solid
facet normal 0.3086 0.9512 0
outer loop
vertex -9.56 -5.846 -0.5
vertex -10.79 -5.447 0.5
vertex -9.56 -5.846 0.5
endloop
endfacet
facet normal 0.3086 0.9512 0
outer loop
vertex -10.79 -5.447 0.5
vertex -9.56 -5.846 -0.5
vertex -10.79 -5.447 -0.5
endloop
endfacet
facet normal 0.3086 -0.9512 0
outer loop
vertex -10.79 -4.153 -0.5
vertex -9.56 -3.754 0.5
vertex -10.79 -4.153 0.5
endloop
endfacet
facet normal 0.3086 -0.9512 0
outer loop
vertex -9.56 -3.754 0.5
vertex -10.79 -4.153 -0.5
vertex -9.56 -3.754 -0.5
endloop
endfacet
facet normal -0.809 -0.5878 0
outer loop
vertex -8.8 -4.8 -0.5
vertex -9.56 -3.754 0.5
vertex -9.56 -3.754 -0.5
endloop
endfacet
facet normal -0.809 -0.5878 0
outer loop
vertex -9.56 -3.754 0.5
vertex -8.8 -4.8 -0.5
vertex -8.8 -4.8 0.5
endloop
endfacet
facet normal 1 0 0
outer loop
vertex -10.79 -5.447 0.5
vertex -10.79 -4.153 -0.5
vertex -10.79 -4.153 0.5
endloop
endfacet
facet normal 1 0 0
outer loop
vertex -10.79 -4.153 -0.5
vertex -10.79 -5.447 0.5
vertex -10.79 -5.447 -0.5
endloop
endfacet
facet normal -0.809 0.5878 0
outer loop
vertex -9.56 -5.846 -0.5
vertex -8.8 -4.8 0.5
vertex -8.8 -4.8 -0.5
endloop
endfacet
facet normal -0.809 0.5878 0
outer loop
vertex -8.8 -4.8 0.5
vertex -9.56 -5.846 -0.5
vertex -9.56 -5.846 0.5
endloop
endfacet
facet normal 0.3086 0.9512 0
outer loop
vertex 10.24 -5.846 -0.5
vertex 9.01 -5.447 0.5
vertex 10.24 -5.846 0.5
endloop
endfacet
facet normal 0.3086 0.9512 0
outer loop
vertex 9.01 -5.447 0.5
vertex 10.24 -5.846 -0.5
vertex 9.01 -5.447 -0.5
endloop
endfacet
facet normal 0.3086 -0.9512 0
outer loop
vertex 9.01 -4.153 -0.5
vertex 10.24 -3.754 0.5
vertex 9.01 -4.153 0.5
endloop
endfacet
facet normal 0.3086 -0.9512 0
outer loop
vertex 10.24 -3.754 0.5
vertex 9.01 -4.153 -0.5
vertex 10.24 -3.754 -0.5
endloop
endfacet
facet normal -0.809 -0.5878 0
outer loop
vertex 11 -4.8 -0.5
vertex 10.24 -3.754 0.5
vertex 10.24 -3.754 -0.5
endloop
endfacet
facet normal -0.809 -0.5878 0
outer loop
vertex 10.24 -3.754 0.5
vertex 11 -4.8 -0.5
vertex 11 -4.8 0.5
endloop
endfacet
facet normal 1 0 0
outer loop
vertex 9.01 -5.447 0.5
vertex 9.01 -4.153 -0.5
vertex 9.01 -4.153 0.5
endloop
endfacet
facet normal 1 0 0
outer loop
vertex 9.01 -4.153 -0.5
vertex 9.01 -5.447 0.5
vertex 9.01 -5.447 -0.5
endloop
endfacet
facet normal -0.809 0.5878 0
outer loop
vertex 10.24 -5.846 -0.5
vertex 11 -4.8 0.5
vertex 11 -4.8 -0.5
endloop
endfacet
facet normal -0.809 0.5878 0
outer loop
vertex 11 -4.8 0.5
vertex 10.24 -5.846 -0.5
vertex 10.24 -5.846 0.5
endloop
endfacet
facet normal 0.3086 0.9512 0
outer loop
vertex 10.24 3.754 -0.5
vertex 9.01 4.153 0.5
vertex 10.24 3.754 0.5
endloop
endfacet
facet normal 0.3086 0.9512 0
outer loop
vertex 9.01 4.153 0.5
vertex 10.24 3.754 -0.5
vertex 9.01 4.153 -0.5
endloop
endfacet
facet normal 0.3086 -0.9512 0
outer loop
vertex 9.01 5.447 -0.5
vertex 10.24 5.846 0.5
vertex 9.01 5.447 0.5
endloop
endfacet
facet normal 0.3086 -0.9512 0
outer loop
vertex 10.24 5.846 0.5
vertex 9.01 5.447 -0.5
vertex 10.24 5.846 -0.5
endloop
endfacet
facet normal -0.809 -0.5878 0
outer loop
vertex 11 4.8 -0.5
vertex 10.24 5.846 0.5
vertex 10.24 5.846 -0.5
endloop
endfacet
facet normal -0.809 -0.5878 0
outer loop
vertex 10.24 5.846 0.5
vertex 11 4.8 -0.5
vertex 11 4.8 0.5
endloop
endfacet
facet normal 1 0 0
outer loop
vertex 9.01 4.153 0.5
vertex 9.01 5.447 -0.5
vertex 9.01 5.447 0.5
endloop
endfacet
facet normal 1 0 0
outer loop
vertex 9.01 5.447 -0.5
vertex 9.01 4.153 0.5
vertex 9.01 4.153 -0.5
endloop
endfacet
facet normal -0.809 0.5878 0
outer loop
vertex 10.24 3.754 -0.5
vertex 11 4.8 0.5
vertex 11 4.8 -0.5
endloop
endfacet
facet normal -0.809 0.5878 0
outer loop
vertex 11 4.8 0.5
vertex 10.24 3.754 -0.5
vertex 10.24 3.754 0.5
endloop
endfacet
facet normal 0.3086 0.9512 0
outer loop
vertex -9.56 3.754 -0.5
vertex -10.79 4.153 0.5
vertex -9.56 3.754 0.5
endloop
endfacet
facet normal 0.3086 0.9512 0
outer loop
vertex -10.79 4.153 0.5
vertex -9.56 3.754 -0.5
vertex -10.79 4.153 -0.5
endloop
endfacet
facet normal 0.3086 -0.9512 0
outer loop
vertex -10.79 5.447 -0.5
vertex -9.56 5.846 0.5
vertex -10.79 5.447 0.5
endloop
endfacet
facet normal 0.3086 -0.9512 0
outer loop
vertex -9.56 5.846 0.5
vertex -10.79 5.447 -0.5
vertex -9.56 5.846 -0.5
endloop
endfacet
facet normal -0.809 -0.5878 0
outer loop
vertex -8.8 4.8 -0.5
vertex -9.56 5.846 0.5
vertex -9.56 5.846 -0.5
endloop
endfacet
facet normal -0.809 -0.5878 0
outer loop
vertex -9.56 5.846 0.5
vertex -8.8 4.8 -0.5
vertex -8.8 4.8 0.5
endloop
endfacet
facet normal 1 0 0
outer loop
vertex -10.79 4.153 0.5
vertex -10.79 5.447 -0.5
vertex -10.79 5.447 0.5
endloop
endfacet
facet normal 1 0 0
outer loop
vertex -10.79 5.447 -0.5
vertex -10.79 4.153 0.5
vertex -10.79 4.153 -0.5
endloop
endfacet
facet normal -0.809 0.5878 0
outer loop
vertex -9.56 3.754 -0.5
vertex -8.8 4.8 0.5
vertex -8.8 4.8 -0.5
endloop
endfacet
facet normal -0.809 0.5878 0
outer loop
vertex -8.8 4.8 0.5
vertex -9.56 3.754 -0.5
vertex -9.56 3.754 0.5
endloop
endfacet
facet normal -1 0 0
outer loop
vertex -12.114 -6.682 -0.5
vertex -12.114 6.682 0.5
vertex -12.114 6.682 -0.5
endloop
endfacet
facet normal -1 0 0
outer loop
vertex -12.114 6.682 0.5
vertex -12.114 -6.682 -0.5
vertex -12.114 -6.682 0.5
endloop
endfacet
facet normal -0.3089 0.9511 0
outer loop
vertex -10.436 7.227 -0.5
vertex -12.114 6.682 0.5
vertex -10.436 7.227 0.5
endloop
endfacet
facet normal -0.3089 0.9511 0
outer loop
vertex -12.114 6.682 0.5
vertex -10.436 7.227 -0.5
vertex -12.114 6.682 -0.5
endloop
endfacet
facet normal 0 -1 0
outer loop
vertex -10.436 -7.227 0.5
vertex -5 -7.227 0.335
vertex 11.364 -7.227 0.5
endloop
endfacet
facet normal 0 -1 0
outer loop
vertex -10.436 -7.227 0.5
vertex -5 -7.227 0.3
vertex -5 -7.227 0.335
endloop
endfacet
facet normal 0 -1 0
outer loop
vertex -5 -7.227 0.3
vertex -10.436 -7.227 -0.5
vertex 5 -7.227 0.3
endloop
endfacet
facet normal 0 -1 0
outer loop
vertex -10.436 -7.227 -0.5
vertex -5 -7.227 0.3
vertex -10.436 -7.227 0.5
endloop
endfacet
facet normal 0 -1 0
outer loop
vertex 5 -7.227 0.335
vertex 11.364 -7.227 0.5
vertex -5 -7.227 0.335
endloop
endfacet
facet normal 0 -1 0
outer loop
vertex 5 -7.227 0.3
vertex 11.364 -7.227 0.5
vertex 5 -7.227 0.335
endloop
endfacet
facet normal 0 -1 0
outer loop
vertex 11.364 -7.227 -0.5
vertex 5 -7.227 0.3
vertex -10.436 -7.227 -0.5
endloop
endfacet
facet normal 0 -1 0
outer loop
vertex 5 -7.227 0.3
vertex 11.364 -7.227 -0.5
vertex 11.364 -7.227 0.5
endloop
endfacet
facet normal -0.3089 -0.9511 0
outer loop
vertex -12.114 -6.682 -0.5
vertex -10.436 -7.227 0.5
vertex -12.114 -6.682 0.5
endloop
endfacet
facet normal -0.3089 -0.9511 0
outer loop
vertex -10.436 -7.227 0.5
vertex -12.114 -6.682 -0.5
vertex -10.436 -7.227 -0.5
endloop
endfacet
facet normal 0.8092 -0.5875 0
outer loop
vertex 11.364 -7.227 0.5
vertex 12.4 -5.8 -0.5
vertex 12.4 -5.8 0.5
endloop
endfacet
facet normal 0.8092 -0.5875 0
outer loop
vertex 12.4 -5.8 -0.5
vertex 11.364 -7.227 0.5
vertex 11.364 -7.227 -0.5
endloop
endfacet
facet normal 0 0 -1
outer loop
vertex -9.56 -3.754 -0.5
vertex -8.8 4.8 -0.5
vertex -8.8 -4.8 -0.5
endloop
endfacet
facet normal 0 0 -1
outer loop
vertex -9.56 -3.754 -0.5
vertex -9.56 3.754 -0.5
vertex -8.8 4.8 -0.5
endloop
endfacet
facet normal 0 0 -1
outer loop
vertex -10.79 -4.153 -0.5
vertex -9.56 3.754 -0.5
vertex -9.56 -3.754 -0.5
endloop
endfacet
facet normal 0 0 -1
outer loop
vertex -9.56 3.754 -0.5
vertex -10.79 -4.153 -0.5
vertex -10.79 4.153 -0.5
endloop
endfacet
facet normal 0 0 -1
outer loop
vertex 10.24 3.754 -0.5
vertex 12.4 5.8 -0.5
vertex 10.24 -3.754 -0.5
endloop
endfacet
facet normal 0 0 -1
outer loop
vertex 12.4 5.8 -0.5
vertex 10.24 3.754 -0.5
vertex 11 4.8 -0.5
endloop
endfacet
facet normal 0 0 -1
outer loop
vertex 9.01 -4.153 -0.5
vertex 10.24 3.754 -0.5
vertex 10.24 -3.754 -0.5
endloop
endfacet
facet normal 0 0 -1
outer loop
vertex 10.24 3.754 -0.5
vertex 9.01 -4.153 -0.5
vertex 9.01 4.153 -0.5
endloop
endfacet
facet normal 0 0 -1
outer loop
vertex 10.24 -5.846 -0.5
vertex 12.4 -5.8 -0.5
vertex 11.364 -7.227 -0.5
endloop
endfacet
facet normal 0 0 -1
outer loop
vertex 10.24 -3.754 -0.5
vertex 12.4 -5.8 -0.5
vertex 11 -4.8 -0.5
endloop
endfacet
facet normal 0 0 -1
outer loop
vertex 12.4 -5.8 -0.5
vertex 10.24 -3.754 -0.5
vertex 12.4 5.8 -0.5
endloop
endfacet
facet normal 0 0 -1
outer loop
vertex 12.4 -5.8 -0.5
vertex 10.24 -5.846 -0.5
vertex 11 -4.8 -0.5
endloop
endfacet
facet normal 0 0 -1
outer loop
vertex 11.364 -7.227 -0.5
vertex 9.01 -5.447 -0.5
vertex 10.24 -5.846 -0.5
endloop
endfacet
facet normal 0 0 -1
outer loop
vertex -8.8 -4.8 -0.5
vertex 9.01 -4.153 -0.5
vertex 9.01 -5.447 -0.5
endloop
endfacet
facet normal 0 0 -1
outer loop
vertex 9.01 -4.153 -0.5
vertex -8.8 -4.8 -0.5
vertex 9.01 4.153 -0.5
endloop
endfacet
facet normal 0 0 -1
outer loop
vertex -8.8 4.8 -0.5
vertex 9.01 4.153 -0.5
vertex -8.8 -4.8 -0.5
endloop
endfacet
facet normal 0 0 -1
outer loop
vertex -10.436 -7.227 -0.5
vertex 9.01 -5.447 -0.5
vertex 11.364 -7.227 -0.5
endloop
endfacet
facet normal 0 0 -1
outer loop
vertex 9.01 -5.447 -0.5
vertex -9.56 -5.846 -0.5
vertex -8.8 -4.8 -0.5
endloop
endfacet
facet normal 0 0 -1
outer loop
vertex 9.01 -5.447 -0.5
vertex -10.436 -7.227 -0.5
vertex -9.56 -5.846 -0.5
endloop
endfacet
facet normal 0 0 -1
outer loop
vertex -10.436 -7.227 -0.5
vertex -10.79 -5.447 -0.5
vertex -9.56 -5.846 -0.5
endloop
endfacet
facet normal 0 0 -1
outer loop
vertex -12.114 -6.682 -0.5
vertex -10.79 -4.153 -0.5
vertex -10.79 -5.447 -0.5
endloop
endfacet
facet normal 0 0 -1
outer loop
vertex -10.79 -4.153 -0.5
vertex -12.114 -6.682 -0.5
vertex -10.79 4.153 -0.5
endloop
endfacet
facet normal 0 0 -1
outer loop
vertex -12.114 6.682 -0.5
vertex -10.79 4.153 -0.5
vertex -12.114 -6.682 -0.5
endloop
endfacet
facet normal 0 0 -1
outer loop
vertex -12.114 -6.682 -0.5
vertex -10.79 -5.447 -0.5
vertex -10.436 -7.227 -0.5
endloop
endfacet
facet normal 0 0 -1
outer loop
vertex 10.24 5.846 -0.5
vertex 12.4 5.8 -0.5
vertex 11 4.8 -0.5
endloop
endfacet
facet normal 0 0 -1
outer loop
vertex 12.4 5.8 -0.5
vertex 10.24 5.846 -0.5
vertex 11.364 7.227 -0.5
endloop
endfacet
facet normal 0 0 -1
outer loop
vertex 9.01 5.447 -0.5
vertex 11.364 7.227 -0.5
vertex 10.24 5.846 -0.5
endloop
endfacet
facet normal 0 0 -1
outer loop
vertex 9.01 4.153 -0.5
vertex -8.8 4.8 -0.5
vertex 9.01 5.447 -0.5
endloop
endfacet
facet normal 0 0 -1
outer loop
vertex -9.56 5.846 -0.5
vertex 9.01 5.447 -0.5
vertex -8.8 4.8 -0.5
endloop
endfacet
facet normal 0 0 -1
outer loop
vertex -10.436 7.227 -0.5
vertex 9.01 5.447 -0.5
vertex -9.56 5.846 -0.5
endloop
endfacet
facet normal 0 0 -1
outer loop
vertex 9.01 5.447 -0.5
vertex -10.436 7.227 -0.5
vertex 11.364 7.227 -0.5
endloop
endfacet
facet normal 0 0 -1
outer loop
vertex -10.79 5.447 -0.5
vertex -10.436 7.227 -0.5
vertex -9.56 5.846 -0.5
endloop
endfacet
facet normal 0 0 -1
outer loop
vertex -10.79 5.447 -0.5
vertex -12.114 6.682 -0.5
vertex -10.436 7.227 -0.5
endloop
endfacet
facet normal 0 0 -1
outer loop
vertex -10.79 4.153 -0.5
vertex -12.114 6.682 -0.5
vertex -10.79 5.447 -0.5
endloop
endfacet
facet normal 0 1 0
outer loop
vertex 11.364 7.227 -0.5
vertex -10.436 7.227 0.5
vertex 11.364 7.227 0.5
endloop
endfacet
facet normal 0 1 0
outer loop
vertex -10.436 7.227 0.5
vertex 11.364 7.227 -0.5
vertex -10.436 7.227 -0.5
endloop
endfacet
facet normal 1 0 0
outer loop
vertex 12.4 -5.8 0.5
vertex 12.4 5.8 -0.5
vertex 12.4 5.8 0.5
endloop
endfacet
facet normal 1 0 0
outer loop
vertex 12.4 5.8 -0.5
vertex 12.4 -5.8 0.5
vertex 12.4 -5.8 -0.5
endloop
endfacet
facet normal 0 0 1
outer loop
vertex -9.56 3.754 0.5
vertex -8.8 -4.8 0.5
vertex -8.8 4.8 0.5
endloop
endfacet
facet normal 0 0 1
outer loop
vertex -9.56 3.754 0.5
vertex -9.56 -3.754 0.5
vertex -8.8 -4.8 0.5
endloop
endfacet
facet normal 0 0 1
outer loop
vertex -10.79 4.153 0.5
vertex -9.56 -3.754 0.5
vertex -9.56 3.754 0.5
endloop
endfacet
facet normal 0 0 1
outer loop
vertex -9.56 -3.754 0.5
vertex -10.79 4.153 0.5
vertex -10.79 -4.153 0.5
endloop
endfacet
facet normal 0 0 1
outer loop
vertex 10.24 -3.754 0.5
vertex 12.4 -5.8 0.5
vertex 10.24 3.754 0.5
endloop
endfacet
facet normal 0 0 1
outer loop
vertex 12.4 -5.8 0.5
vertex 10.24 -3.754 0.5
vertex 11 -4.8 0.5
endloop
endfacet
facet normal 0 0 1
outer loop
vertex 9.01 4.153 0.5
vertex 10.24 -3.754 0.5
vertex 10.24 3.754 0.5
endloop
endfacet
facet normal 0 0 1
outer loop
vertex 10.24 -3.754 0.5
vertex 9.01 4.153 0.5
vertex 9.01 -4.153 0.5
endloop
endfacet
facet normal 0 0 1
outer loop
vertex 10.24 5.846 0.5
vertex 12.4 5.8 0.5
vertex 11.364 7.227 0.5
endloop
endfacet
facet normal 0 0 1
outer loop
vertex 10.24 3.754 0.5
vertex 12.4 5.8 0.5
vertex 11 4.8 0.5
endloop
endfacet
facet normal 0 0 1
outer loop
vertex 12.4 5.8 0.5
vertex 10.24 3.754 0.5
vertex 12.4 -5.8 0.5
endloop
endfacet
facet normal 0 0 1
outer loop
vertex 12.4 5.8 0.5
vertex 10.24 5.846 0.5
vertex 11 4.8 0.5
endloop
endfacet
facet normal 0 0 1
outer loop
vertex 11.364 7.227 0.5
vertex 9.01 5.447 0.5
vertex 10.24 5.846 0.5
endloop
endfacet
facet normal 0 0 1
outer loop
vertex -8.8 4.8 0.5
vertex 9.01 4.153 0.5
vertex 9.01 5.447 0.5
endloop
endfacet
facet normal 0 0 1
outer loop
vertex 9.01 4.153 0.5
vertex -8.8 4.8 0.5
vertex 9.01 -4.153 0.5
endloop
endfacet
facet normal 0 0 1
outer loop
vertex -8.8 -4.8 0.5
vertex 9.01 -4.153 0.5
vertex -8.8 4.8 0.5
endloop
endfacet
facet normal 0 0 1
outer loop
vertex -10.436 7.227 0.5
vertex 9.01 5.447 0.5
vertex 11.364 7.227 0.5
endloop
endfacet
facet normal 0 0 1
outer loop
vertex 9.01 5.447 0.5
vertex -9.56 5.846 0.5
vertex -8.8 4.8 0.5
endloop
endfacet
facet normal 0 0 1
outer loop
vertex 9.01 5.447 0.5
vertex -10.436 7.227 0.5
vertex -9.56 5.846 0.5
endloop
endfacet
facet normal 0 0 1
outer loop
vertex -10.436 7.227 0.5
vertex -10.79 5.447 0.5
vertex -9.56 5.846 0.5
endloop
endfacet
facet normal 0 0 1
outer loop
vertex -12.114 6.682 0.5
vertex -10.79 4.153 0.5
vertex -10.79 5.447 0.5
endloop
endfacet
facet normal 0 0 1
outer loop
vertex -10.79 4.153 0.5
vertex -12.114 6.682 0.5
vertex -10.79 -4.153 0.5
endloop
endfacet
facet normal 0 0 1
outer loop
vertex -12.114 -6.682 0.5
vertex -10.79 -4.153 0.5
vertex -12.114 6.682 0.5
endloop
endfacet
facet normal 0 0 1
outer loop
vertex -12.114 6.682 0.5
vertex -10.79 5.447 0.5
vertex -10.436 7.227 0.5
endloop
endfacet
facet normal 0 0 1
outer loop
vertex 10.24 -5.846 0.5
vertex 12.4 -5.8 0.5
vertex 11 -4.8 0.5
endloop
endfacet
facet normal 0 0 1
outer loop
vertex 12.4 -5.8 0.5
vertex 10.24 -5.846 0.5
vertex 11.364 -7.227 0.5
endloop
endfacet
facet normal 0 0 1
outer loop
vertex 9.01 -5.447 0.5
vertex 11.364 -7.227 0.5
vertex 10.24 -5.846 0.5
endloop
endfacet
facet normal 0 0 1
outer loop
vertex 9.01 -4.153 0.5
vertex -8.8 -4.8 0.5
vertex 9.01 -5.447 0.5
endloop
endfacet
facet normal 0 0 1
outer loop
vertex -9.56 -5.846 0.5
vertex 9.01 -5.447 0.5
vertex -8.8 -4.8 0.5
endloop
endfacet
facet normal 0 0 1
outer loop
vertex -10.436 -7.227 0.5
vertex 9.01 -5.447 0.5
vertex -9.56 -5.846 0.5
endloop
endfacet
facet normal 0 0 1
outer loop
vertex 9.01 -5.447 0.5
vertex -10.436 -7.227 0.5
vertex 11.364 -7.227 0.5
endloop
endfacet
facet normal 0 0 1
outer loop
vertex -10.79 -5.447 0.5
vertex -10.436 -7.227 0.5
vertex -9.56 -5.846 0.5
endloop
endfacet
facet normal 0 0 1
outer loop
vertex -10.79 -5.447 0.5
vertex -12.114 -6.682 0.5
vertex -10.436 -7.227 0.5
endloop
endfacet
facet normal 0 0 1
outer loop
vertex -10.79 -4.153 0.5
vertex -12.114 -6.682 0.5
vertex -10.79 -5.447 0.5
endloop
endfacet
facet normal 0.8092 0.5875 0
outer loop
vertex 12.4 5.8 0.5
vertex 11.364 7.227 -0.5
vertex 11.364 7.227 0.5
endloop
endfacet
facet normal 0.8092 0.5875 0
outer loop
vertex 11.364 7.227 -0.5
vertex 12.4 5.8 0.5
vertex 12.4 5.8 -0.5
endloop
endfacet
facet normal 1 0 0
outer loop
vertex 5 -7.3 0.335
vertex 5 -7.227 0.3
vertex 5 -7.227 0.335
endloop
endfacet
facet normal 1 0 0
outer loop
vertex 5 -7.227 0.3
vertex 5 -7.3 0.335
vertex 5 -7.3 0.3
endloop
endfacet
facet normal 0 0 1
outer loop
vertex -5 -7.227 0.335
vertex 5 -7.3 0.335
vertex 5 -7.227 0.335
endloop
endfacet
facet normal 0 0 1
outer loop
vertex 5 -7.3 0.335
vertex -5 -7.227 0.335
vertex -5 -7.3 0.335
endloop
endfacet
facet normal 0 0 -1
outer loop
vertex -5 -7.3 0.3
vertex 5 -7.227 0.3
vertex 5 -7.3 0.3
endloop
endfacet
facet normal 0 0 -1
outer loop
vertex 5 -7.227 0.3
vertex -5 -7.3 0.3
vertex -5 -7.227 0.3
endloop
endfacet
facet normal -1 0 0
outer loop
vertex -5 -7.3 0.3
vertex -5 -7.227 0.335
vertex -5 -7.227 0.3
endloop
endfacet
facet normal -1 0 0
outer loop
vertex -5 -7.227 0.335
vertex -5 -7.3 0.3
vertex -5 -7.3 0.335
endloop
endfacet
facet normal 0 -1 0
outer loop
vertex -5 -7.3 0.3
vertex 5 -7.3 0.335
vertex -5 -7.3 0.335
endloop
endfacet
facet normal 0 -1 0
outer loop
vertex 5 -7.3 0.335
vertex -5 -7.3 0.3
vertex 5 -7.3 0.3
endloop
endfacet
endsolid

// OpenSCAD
// Parameters
pcb_length = 24.8; //[12.4:49.6:0.1]
pcb_width = 14.6; //[7.3:29.2:0.1]
pcb_thickness = 1.0; //[0.5:2.0:0.1]
corner_radius = 1.5; //[0.5:3.0:0.1]
mount_hole_diameter = 2.2; //[1.0:4.0:0.1]
mount_hole_edge_offset = 2.5; //[1.0:5.0:0.1]
hole_cut_extra = 0.5; //[0.2:2.0:0.1]
silkscreen_thickness = 0.05; //[0.02:0.2:0.01]
silkscreen_margin = 0.8; //[0.3:2.0:0.1]
silkscreen_line_width = 0.4; //[0.2:1.0:0.05]
copper_thickness = 0.035; //[0.01:0.1:0.005]
pad_diameter = 1.6; //[0.8:3.0:0.1]
pad_pitch = 2.54; //[1.27:5.08:0.01]
pad_row_y_offset = 3.0; //[1.5:6.0:0.1]
edge_connector_length = 10.0; //[5.0:20.0:0.1]
edge_connector_depth = 3.0; //[1.5:6.0:0.1]
feature_overlap = 0.2; //[0.05:1.0:0.05]

// Base shapes
module pcb_corner_cyl(pos) {
  translate(pos)
    cylinder(r=corner_radius, h=pcb_thickness, center=true);
}

module mount_hole(pos) {
  translate(pos)
    cylinder(r=mount_hole_diameter/2, h=pcb_thickness + hole_cut_extra, center=true);
}

module silkscreen_box(size, pos) {
  translate(pos)
    cube(size, center=true);
}

module pad(pos) {
  translate(pos)
    cylinder(r=pad_diameter/2, h=copper_thickness, center=true);
}

module edge_connector() {
  translate([0, -pcb_width/2 + edge_connector_depth/2, pcb_thickness/2 + copper_thickness/2 - feature_overlap])
    cube([edge_connector_length, edge_connector_depth, copper_thickness], center=true);
}

// Operations
module rounded_corners() {
  hull() {
    pcb_corner_cyl([pcb_length/2 - corner_radius, pcb_width/2 - corner_radius, 0]);
    pcb_corner_cyl([-pcb_length/2 + corner_radius, pcb_width/2 - corner_radius, 0]);
    pcb_corner_cyl([-pcb_length/2 + corner_radius, -pcb_width/2 + corner_radius, 0]);
    pcb_corner_cyl([pcb_length/2 - corner_radius, -pcb_width/2 + corner_radius, 0]);
  }
}

module mounting_holes() {
  union() {
    mount_hole([-pcb_length/2 + mount_hole_edge_offset, -pcb_width/2 + mount_hole_edge_offset, 0]);
    mount_hole([pcb_length/2 - mount_hole_edge_offset, -pcb_width/2 + mount_hole_edge_offset, 0]);
    mount_hole([pcb_length/2 - mount_hole_edge_offset, pcb_width/2 - mount_hole_edge_offset, 0]);
    mount_hole([-pcb_length/2 + mount_hole_edge_offset, pcb_width/2 - mount_hole_edge_offset, 0]);
  }
}

module pcb_body() {
  difference() {
    rounded_corners();
    mounting_holes();
  }
}

module silkscreen_markings() {
  union() {
    silkscreen_box([pcb_length - 2*silkscreen_margin, silkscreen_line_width, silkscreen_thickness],
                   [0, pcb_width/2 - silkscreen_margin - silkscreen_line_width/2, pcb_thickness/2 + silkscreen_thickness/2 - feature_overlap]);
    silkscreen_box([pcb_length - 2*silkscreen_margin, silkscreen_line_width, silkscreen_thickness],
                   [0, -pcb_width/2 + silkscreen_margin + silkscreen_line_width/2, pcb_thickness/2 + silkscreen_thickness/2 - feature_overlap]);
    silkscreen_box([silkscreen_line_width, pcb_width - 2*silkscreen_margin, silkscreen_thickness],
                   [-pcb_length/2 + silkscreen_margin + silkscreen_line_width/2, 0, pcb_thickness/2 + silkscreen_thickness/2 - feature_overlap]);
    silkscreen_box([silkscreen_line_width, pcb_width - 2*silkscreen_margin, silkscreen_thickness],
                   [pcb_length/2 - silkscreen_margin - silkscreen_line_width/2, 0, pcb_thickness/2 + silkscreen_thickness/2 - feature_overlap]);
  }
}

module copper_pads() {
  union() {
    pad([-pad_pitch*1.5, pad_row_y_offset, pcb_thickness/2 + copper_thickness/2 - feature_overlap]);
    pad([-pad_pitch*0.5, pad_row_y_offset, pcb_thickness/2 + copper_thickness/2 - feature_overlap]);
    pad([pad_pitch*0.5, pad_row_y_offset, pcb_thickness/2 + copper_thickness/2 - feature_overlap]);
    pad([pad_pitch*1.5, pad_row_y_offset, pcb_thickness/2 + copper_thickness/2 - feature_overlap]);
  }
}

module copper_features() {
  union() {
    copper_pads();
    edge_connector();
  }
}

// Final model
module complete_model() {
  union() {
    pcb_body();
    silkscreen_markings();
    copper_features();
  }
}

// Render the complete model
color([0.0, 0.4, 0.2]) // PCB color
complete_model();
